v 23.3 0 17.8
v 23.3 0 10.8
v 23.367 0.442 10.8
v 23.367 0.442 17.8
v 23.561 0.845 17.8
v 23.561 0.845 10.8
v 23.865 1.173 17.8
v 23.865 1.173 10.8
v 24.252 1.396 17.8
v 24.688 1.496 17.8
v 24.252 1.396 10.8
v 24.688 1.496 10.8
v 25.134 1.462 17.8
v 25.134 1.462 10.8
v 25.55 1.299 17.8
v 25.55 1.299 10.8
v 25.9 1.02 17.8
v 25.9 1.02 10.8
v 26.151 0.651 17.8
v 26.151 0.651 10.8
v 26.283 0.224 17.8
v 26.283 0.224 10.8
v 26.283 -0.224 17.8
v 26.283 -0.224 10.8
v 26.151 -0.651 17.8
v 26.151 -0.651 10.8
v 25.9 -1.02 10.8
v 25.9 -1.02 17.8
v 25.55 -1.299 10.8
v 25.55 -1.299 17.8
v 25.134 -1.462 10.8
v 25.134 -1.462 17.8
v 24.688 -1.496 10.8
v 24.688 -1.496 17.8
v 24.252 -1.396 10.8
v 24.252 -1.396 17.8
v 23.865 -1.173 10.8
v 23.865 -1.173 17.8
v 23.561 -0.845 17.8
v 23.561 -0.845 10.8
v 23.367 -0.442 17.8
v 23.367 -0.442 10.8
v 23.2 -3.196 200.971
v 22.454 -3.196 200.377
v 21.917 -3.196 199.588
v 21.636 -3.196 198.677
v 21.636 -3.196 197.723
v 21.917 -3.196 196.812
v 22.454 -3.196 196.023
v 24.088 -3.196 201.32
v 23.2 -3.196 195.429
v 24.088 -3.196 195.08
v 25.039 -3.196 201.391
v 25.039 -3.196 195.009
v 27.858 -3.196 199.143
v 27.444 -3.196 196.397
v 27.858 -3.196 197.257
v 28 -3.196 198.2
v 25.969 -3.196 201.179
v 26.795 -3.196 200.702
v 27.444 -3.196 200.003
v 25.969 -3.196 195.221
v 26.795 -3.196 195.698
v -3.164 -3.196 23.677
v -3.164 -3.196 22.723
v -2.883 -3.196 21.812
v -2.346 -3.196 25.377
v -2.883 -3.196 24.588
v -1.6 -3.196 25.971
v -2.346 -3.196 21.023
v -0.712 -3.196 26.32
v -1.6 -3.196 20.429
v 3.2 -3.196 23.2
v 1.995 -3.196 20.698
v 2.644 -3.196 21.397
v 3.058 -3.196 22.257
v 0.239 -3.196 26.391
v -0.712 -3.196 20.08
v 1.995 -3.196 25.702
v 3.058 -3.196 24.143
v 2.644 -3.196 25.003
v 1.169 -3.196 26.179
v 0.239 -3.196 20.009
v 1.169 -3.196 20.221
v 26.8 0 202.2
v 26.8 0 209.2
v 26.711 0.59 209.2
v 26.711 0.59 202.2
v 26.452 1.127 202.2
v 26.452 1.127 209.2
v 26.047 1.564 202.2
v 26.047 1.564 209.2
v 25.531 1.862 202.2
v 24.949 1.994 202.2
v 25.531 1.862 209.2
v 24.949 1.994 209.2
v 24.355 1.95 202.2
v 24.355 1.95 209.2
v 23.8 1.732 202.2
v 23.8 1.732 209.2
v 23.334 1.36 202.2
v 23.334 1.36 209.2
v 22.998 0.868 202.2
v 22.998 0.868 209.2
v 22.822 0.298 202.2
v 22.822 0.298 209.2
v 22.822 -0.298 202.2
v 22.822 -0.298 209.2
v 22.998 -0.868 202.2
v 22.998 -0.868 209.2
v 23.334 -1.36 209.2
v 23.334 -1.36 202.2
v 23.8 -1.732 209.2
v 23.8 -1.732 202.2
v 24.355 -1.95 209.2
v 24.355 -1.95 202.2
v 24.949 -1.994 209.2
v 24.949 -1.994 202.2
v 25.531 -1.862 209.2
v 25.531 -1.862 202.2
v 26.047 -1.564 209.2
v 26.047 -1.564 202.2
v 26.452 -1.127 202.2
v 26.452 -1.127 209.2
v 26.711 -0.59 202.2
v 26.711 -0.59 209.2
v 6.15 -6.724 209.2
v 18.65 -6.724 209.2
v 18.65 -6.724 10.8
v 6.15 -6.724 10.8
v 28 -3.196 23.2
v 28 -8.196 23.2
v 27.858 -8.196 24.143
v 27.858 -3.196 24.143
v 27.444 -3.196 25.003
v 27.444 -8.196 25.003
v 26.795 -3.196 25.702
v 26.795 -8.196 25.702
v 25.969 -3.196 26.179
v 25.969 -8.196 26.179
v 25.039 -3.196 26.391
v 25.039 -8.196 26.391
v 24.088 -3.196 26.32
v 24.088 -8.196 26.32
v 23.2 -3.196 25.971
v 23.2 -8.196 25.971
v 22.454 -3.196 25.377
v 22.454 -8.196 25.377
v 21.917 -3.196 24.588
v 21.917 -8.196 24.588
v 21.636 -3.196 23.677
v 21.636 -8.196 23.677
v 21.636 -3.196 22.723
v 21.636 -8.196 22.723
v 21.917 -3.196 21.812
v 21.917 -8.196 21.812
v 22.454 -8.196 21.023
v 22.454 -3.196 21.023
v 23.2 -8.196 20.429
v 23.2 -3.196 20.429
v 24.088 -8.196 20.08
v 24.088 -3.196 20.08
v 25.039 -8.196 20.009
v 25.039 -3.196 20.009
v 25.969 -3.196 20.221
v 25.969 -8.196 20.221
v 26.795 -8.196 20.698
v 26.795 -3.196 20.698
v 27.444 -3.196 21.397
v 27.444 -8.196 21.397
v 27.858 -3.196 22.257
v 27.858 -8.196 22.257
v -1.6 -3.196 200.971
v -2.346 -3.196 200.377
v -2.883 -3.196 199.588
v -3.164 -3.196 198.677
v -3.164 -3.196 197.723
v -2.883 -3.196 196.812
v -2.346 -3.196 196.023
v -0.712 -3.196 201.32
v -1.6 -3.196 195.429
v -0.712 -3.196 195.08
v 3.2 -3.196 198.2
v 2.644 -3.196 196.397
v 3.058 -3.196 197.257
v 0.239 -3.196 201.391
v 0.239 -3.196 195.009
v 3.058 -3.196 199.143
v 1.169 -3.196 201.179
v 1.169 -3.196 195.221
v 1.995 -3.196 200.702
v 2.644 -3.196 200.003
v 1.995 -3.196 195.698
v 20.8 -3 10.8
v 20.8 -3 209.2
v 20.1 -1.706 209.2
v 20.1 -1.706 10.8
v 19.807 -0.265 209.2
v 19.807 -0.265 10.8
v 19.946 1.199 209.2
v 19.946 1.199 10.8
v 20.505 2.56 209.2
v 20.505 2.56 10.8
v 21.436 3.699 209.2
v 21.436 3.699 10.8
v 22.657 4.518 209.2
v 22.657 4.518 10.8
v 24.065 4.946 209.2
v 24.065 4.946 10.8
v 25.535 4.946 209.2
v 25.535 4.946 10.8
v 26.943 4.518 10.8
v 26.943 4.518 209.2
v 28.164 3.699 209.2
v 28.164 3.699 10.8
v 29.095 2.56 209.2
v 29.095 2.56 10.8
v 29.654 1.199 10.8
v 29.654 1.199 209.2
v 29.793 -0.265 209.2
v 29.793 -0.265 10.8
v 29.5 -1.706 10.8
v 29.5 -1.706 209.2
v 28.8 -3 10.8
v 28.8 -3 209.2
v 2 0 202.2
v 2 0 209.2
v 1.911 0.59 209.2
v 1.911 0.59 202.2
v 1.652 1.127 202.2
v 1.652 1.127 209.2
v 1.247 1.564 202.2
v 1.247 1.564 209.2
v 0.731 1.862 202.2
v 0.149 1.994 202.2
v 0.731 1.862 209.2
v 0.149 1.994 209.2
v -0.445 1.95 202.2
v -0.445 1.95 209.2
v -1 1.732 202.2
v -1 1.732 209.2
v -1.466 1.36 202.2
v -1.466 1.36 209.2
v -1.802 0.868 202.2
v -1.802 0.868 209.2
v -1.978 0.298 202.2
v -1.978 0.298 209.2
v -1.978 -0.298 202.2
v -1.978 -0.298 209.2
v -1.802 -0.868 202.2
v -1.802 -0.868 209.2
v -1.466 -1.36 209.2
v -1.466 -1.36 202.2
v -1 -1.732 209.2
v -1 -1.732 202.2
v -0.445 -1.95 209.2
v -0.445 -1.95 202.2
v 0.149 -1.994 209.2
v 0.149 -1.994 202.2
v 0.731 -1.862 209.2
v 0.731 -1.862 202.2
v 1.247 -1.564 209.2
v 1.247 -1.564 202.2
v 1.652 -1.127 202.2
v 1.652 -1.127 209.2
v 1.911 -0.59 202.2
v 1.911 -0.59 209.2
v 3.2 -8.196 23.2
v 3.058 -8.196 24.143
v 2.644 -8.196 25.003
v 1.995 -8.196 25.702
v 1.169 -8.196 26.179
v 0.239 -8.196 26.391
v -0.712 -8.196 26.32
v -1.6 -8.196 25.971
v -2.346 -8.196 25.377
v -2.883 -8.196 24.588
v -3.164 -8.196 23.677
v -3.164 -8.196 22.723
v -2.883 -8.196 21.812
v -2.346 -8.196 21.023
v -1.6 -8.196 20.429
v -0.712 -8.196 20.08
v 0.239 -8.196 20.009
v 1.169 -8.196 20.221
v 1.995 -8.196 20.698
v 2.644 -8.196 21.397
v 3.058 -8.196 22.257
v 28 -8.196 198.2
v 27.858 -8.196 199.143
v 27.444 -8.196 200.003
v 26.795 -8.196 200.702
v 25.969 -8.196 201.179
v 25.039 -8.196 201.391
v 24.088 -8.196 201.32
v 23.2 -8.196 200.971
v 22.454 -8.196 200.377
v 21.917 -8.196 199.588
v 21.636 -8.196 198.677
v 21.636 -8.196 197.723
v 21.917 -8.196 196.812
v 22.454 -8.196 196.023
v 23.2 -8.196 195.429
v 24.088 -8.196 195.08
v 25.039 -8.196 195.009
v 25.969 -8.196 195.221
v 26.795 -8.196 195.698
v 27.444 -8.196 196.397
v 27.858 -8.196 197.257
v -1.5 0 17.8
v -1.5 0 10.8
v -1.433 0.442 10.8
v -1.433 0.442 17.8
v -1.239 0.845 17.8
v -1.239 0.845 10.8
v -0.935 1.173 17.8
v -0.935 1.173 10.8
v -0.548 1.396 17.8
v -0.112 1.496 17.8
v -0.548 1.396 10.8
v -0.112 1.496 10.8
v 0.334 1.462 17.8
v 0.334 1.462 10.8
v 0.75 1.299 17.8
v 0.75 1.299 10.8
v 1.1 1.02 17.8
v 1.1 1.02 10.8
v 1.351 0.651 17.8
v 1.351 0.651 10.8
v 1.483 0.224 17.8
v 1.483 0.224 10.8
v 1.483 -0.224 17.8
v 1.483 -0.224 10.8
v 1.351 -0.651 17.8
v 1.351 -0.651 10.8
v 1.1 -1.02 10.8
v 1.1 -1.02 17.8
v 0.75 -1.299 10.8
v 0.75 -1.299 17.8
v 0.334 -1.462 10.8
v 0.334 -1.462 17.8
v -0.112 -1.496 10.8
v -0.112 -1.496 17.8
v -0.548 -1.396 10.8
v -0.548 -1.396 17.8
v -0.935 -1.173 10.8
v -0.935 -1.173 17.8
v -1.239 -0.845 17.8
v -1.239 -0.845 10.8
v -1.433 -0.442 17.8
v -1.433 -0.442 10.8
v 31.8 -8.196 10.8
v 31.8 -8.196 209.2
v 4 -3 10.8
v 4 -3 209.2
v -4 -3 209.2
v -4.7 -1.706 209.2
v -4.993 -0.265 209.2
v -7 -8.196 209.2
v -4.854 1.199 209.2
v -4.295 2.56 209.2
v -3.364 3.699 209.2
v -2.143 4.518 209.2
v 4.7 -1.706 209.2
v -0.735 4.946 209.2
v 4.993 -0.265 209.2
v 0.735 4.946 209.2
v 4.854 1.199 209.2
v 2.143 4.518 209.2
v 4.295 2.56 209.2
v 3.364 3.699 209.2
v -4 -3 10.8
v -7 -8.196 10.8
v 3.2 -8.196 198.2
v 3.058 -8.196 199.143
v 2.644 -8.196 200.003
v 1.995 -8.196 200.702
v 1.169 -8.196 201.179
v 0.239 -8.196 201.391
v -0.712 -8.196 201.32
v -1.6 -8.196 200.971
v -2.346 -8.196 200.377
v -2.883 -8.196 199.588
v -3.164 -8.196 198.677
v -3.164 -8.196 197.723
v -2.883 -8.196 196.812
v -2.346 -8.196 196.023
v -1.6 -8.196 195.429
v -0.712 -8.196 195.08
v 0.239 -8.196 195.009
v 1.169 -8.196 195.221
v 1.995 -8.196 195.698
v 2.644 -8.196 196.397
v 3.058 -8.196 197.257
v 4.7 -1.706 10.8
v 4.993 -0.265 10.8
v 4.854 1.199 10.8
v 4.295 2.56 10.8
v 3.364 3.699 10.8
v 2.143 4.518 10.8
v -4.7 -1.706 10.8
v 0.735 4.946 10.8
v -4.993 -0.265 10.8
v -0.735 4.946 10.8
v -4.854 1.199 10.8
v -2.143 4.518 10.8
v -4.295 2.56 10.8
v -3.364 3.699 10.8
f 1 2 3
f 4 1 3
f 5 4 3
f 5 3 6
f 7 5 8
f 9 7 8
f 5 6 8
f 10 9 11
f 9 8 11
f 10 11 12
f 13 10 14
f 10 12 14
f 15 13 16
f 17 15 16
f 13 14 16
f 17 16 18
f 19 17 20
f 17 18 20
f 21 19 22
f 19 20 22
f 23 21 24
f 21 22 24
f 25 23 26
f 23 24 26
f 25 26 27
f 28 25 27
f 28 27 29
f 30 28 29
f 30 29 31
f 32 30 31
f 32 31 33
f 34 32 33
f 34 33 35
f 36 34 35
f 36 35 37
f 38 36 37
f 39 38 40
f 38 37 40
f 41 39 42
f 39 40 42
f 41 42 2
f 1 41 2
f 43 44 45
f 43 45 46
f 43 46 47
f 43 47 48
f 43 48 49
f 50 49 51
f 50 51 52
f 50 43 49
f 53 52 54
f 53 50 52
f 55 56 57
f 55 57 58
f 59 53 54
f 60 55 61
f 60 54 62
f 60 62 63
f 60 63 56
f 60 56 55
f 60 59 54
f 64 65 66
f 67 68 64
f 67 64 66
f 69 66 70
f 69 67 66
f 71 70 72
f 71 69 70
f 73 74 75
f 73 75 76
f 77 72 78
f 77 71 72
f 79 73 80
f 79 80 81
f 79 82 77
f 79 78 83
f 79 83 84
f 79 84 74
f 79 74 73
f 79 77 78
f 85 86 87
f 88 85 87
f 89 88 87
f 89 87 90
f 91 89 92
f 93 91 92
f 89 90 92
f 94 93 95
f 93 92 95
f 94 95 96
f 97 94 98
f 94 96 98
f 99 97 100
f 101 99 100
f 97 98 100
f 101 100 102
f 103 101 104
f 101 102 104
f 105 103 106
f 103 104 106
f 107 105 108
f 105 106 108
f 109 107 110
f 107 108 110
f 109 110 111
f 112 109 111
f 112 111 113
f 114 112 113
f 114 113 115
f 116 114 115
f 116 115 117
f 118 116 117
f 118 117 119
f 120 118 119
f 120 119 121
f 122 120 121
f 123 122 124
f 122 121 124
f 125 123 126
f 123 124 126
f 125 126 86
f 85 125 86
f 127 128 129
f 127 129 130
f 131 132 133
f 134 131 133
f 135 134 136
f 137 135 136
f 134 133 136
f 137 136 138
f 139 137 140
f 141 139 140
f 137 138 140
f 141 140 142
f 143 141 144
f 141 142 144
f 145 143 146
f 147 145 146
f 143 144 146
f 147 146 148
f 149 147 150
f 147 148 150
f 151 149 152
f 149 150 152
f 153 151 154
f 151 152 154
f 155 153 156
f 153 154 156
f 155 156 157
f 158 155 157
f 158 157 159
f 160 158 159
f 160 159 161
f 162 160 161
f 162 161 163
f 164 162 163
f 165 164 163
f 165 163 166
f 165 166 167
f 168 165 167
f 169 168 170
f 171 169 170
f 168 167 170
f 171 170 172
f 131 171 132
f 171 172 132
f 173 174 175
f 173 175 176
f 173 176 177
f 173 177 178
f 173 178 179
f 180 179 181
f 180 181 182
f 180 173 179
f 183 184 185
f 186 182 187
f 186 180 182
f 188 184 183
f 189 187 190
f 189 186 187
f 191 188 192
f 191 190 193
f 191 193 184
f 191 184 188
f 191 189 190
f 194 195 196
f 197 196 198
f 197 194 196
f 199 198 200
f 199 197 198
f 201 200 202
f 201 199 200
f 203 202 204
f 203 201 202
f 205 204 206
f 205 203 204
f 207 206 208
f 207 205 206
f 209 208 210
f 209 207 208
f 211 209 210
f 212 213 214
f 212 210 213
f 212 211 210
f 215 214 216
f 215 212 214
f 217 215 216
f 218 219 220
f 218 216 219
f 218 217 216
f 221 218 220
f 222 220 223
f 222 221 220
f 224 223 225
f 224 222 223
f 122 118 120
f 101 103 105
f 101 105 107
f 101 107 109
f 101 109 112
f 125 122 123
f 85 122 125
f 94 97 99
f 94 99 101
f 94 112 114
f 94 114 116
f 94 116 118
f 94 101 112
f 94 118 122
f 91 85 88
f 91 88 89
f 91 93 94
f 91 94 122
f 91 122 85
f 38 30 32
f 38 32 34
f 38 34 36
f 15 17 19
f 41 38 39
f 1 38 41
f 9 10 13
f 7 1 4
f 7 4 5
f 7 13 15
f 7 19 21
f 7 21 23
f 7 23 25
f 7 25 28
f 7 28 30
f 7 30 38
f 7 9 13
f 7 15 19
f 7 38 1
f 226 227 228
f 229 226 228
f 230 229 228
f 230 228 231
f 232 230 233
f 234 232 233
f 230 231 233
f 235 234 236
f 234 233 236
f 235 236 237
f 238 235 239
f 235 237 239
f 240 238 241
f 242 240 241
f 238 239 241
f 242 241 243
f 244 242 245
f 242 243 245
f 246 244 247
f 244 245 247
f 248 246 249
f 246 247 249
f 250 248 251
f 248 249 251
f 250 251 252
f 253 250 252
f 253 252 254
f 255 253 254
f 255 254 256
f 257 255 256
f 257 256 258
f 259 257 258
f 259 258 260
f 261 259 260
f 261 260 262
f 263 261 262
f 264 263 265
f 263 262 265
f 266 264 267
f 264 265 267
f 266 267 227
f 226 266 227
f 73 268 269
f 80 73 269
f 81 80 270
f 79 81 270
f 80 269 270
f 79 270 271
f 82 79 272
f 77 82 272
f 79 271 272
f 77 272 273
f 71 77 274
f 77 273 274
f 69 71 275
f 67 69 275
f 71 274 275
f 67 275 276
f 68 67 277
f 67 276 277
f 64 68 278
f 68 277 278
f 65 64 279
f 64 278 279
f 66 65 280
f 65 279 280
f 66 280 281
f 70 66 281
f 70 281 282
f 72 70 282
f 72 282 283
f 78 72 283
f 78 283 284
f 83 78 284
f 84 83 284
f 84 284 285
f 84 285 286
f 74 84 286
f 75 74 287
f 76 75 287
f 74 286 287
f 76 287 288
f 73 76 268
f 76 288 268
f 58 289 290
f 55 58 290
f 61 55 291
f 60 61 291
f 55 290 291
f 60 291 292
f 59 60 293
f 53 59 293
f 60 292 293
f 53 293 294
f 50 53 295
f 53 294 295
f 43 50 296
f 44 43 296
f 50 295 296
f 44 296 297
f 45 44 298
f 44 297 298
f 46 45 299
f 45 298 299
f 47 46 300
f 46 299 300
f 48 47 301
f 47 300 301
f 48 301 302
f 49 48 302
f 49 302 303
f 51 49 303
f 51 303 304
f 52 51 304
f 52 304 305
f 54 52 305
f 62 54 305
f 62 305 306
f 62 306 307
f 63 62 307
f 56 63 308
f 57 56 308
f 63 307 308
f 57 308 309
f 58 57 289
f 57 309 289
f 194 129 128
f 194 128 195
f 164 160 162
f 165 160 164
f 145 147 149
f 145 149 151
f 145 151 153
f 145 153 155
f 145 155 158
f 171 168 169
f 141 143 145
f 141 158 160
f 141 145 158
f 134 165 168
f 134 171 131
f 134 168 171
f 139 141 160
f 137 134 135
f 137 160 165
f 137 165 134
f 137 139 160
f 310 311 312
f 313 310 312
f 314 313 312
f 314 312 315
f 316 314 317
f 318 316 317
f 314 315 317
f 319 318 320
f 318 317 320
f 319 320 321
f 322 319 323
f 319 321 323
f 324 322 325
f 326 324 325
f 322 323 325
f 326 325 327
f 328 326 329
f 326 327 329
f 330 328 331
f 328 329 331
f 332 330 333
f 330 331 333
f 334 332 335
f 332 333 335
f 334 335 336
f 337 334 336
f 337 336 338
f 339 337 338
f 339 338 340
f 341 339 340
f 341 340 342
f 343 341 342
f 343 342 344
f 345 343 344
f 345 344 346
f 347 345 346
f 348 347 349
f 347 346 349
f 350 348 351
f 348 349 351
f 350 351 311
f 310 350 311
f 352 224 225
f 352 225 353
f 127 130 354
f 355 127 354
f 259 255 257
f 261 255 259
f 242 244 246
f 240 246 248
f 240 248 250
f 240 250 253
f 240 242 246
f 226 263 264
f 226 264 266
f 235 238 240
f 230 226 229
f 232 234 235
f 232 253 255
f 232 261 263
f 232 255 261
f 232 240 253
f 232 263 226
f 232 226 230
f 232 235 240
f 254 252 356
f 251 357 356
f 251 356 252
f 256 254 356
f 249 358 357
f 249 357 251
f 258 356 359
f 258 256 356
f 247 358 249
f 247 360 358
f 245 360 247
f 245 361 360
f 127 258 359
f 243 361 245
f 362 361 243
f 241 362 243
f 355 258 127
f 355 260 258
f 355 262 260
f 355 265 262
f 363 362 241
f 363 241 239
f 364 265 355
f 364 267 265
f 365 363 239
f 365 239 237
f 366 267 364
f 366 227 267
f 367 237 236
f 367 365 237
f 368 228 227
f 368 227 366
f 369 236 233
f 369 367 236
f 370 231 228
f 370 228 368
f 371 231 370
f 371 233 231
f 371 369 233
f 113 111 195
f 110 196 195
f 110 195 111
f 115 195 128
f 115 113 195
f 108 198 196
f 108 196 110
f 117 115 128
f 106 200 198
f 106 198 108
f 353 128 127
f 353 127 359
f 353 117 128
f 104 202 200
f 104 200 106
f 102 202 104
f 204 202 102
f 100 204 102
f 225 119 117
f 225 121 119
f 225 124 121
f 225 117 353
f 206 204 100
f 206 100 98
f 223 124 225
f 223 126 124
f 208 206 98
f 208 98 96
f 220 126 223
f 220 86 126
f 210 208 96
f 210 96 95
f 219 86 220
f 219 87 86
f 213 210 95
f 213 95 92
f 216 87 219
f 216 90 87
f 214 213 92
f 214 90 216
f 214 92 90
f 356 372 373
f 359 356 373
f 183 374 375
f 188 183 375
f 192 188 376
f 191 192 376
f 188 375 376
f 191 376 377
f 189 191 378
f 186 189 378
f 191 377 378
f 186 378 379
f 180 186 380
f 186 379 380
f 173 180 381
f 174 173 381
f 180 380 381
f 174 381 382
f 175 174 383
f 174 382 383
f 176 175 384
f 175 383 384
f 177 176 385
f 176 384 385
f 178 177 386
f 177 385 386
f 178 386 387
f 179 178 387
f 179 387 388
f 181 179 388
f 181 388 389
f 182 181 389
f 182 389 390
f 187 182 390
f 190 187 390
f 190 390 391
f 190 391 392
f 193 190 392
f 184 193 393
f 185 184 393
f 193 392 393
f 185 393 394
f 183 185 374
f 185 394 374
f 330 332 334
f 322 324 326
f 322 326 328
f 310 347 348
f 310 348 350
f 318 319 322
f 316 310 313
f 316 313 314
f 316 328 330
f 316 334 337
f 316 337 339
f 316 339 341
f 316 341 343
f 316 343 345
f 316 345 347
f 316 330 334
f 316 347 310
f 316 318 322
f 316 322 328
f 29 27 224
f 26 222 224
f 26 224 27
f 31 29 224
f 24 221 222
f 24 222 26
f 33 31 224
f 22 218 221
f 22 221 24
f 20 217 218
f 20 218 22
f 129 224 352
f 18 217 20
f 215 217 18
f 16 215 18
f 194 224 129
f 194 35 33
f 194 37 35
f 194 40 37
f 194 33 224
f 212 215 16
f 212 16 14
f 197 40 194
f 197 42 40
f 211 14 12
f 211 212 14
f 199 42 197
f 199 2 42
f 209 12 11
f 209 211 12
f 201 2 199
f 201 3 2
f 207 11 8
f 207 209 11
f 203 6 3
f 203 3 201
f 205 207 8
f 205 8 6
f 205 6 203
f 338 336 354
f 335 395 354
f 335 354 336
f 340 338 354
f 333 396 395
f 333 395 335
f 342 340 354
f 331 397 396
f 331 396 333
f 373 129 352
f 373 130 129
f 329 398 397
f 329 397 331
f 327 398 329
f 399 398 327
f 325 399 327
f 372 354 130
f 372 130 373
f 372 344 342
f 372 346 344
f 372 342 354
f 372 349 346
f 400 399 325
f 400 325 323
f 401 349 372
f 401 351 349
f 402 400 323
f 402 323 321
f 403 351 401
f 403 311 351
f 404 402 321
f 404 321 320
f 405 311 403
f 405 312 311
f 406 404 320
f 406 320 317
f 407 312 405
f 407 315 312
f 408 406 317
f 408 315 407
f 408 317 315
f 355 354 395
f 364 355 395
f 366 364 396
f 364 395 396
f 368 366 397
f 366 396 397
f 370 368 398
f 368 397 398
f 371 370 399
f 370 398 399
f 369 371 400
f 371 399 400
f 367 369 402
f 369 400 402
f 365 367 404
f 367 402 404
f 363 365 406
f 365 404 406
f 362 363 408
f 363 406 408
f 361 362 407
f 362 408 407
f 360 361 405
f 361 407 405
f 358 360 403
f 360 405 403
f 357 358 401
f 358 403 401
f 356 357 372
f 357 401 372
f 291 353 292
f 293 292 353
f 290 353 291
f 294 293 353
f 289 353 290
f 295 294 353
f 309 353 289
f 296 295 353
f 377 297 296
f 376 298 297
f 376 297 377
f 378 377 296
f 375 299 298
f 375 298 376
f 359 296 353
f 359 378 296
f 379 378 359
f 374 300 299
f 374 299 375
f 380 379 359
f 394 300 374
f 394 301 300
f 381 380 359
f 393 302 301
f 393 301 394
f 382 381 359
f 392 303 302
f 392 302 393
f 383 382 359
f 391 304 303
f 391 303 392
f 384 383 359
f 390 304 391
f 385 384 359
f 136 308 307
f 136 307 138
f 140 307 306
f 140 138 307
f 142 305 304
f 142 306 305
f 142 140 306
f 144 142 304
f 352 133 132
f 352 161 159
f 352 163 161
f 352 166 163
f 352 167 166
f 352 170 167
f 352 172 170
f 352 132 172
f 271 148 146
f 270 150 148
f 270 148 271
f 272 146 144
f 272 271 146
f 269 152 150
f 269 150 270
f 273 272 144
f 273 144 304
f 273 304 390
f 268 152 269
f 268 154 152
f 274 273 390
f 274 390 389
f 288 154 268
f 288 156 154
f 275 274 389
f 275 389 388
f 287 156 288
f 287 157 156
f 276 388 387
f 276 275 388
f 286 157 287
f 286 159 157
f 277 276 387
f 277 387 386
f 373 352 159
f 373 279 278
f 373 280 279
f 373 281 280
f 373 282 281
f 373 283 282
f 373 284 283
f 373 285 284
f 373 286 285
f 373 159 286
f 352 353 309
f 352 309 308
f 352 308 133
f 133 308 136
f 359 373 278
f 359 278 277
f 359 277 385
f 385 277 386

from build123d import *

# Parameters (mm, degrees)
SKETCH1_R           = 5
BOSS_EXTRUDE1_DEPTH = 220
BOSS_EXTRUDE4_DEPTH = 220
SKETCH5_R           = 1.37
CUT_EXTRUDE1_DEPTH  = 7
SKETCH6_R           = 1.37
CUT_EXTRUDE2_DEPTH  = 7
CUT_EXTRUDE4_DEPTH  = 10.8
CUT_EXTRUDE5_DEPTH  = 10.8
SKETCH11_R          = 2
CUT_EXTRUDE6_DEPTH  = 7
SKETCH12_R          = 1.5
CUT_EXTRUDE7_DEPTH  = 7
SKETCH4_R           = 3.2
CUT_EXTRUDE9_DEPTH  = 5


with BuildPart() as part:
    # Sketch1 → Boss-Extrude1 (new body)
    with BuildSketch(Plane.XY):
        Circle(SKETCH1_R)
        with BuildLine():
            Line((-4, -3), (-7, -8.196152423))
            Line((-7, -8.196152423), (7, -8.196152423))
            Line((7, -8.196152423), (4, -3))
            ThreePointArc((4, -3), (0, 5), (-4, -3))
        make_face()
        with BuildLine():
            Line((28.8, -3), (31.8, -8.196152423))
            Line((31.8, -8.196152423), (17.8, -8.196152423))
            Line((17.8, -8.196152423), (20.8, -3))
            ThreePointArc((20.8, -3), (24.8, 5), (28.8, -3))
        make_face()
    extrude(amount=BOSS_EXTRUDE1_DEPTH)

    # Sketch3 → Boss-Extrude4 (add)
    with BuildSketch(Plane.XY.offset(220)):
        Polygon((7, -8.196152423), (17.8, -8.196152423), (18.65, -8.196152423), (18.65, -6.723909236), (6.15, -6.723909236), (6.15, -8.196152423), align=None)
    extrude(amount=-BOSS_EXTRUDE4_DEPTH)

    # Sketch5 → Cut-Extrude1 (cut)
    with BuildSketch(Plane(origin=(0, 0, 0), x_dir=(-1, 0, 0), z_dir=(0, 0, -1))):
        Circle(SKETCH5_R)
        with Locations((-24.8, 0)):
            Circle(SKETCH5_R)
    extrude(amount=-CUT_EXTRUDE1_DEPTH, mode=Mode.SUBTRACT)

    # Sketch6 → Cut-Extrude2 (cut)
    with BuildSketch(Plane.XY.offset(220)):
        Circle(SKETCH6_R)
        with Locations((24.8, 0)):
            Circle(SKETCH6_R)
    extrude(amount=-CUT_EXTRUDE2_DEPTH, mode=Mode.SUBTRACT)

    # Sketch9 → Cut-Extrude4 (cut)
    with BuildSketch(Plane(origin=(0, 0, 0), x_dir=(-1, 0, 0), z_dir=(0, 0, -1))):
        with BuildLine():
            Line((-28.8, -3), (-31.8, -8.196152423))
            Line((-31.8, -8.196152423), (7, -8.196152423))
            Line((7, -8.196152423), (4, -3))
            ThreePointArc((4, -3), (0, 5), (-4, -3))
            Line((-4, -3), (-6.15, -6.723909236))
            Line((-6.15, -6.723909236), (-18.65, -6.723909236))
            Line((-18.65, -6.723909236), (-20.8, -3))
            ThreePointArc((-20.8, -3), (-24.8, 5), (-28.8, -3))
        make_face()
    extrude(amount=-CUT_EXTRUDE4_DEPTH, mode=Mode.SUBTRACT)

    # Sketch10 → Cut-Extrude5 (cut)
    with BuildSketch(Plane.XY.offset(220)):
        with BuildLine():
            Line((20.8, -3), (18.65, -6.723909236))
            Line((18.65, -6.723909236), (6.15, -6.723909236))
            Line((6.15, -6.723909236), (4, -3))
            ThreePointArc((4, -3), (0, 5), (-4, -3))
            Line((-4, -3), (-7, -8.196152423))
            Line((-7, -8.196152423), (31.8, -8.196152423))
            Line((31.8, -8.196152423), (28.8, -3))
            ThreePointArc((28.8, -3), (24.8, 5), (20.8, -3))
        make_face()
    extrude(amount=-CUT_EXTRUDE5_DEPTH, mode=Mode.SUBTRACT)

    # Sketch11 → Cut-Extrude6 (cut)
    with BuildSketch(Plane.XY.offset(209.2)):
        Circle(SKETCH11_R)
        with Locations((24.8, 0)):
            Circle(SKETCH11_R)
    extrude(amount=-CUT_EXTRUDE6_DEPTH, mode=Mode.SUBTRACT)

    # Sketch12 → Cut-Extrude7 (cut)
    with BuildSketch(Plane(origin=(0, 0, 10.8), x_dir=(-1, 0, 0), z_dir=(0, 0, -1))):
        Circle(SKETCH12_R)
        with Locations((-24.8, 0)):
            Circle(SKETCH12_R)
    extrude(amount=-CUT_EXTRUDE7_DEPTH, mode=Mode.SUBTRACT)

    # Sketch4 → Cut-Extrude9 (cut)
    with BuildSketch(Plane.XZ.offset(8.196152423)):
        with Locations((0, 23.2)):
            Circle(SKETCH4_R)
        with Locations((24.8, 23.2)):
            Circle(SKETCH4_R)
        with Locations((0, 198.2)):
            Circle(SKETCH4_R)
        with Locations((24.8, 198.2)):
            Circle(SKETCH4_R)
    extrude(amount=-CUT_EXTRUDE9_DEPTH, mode=Mode.SUBTRACT)


solid = part.part
